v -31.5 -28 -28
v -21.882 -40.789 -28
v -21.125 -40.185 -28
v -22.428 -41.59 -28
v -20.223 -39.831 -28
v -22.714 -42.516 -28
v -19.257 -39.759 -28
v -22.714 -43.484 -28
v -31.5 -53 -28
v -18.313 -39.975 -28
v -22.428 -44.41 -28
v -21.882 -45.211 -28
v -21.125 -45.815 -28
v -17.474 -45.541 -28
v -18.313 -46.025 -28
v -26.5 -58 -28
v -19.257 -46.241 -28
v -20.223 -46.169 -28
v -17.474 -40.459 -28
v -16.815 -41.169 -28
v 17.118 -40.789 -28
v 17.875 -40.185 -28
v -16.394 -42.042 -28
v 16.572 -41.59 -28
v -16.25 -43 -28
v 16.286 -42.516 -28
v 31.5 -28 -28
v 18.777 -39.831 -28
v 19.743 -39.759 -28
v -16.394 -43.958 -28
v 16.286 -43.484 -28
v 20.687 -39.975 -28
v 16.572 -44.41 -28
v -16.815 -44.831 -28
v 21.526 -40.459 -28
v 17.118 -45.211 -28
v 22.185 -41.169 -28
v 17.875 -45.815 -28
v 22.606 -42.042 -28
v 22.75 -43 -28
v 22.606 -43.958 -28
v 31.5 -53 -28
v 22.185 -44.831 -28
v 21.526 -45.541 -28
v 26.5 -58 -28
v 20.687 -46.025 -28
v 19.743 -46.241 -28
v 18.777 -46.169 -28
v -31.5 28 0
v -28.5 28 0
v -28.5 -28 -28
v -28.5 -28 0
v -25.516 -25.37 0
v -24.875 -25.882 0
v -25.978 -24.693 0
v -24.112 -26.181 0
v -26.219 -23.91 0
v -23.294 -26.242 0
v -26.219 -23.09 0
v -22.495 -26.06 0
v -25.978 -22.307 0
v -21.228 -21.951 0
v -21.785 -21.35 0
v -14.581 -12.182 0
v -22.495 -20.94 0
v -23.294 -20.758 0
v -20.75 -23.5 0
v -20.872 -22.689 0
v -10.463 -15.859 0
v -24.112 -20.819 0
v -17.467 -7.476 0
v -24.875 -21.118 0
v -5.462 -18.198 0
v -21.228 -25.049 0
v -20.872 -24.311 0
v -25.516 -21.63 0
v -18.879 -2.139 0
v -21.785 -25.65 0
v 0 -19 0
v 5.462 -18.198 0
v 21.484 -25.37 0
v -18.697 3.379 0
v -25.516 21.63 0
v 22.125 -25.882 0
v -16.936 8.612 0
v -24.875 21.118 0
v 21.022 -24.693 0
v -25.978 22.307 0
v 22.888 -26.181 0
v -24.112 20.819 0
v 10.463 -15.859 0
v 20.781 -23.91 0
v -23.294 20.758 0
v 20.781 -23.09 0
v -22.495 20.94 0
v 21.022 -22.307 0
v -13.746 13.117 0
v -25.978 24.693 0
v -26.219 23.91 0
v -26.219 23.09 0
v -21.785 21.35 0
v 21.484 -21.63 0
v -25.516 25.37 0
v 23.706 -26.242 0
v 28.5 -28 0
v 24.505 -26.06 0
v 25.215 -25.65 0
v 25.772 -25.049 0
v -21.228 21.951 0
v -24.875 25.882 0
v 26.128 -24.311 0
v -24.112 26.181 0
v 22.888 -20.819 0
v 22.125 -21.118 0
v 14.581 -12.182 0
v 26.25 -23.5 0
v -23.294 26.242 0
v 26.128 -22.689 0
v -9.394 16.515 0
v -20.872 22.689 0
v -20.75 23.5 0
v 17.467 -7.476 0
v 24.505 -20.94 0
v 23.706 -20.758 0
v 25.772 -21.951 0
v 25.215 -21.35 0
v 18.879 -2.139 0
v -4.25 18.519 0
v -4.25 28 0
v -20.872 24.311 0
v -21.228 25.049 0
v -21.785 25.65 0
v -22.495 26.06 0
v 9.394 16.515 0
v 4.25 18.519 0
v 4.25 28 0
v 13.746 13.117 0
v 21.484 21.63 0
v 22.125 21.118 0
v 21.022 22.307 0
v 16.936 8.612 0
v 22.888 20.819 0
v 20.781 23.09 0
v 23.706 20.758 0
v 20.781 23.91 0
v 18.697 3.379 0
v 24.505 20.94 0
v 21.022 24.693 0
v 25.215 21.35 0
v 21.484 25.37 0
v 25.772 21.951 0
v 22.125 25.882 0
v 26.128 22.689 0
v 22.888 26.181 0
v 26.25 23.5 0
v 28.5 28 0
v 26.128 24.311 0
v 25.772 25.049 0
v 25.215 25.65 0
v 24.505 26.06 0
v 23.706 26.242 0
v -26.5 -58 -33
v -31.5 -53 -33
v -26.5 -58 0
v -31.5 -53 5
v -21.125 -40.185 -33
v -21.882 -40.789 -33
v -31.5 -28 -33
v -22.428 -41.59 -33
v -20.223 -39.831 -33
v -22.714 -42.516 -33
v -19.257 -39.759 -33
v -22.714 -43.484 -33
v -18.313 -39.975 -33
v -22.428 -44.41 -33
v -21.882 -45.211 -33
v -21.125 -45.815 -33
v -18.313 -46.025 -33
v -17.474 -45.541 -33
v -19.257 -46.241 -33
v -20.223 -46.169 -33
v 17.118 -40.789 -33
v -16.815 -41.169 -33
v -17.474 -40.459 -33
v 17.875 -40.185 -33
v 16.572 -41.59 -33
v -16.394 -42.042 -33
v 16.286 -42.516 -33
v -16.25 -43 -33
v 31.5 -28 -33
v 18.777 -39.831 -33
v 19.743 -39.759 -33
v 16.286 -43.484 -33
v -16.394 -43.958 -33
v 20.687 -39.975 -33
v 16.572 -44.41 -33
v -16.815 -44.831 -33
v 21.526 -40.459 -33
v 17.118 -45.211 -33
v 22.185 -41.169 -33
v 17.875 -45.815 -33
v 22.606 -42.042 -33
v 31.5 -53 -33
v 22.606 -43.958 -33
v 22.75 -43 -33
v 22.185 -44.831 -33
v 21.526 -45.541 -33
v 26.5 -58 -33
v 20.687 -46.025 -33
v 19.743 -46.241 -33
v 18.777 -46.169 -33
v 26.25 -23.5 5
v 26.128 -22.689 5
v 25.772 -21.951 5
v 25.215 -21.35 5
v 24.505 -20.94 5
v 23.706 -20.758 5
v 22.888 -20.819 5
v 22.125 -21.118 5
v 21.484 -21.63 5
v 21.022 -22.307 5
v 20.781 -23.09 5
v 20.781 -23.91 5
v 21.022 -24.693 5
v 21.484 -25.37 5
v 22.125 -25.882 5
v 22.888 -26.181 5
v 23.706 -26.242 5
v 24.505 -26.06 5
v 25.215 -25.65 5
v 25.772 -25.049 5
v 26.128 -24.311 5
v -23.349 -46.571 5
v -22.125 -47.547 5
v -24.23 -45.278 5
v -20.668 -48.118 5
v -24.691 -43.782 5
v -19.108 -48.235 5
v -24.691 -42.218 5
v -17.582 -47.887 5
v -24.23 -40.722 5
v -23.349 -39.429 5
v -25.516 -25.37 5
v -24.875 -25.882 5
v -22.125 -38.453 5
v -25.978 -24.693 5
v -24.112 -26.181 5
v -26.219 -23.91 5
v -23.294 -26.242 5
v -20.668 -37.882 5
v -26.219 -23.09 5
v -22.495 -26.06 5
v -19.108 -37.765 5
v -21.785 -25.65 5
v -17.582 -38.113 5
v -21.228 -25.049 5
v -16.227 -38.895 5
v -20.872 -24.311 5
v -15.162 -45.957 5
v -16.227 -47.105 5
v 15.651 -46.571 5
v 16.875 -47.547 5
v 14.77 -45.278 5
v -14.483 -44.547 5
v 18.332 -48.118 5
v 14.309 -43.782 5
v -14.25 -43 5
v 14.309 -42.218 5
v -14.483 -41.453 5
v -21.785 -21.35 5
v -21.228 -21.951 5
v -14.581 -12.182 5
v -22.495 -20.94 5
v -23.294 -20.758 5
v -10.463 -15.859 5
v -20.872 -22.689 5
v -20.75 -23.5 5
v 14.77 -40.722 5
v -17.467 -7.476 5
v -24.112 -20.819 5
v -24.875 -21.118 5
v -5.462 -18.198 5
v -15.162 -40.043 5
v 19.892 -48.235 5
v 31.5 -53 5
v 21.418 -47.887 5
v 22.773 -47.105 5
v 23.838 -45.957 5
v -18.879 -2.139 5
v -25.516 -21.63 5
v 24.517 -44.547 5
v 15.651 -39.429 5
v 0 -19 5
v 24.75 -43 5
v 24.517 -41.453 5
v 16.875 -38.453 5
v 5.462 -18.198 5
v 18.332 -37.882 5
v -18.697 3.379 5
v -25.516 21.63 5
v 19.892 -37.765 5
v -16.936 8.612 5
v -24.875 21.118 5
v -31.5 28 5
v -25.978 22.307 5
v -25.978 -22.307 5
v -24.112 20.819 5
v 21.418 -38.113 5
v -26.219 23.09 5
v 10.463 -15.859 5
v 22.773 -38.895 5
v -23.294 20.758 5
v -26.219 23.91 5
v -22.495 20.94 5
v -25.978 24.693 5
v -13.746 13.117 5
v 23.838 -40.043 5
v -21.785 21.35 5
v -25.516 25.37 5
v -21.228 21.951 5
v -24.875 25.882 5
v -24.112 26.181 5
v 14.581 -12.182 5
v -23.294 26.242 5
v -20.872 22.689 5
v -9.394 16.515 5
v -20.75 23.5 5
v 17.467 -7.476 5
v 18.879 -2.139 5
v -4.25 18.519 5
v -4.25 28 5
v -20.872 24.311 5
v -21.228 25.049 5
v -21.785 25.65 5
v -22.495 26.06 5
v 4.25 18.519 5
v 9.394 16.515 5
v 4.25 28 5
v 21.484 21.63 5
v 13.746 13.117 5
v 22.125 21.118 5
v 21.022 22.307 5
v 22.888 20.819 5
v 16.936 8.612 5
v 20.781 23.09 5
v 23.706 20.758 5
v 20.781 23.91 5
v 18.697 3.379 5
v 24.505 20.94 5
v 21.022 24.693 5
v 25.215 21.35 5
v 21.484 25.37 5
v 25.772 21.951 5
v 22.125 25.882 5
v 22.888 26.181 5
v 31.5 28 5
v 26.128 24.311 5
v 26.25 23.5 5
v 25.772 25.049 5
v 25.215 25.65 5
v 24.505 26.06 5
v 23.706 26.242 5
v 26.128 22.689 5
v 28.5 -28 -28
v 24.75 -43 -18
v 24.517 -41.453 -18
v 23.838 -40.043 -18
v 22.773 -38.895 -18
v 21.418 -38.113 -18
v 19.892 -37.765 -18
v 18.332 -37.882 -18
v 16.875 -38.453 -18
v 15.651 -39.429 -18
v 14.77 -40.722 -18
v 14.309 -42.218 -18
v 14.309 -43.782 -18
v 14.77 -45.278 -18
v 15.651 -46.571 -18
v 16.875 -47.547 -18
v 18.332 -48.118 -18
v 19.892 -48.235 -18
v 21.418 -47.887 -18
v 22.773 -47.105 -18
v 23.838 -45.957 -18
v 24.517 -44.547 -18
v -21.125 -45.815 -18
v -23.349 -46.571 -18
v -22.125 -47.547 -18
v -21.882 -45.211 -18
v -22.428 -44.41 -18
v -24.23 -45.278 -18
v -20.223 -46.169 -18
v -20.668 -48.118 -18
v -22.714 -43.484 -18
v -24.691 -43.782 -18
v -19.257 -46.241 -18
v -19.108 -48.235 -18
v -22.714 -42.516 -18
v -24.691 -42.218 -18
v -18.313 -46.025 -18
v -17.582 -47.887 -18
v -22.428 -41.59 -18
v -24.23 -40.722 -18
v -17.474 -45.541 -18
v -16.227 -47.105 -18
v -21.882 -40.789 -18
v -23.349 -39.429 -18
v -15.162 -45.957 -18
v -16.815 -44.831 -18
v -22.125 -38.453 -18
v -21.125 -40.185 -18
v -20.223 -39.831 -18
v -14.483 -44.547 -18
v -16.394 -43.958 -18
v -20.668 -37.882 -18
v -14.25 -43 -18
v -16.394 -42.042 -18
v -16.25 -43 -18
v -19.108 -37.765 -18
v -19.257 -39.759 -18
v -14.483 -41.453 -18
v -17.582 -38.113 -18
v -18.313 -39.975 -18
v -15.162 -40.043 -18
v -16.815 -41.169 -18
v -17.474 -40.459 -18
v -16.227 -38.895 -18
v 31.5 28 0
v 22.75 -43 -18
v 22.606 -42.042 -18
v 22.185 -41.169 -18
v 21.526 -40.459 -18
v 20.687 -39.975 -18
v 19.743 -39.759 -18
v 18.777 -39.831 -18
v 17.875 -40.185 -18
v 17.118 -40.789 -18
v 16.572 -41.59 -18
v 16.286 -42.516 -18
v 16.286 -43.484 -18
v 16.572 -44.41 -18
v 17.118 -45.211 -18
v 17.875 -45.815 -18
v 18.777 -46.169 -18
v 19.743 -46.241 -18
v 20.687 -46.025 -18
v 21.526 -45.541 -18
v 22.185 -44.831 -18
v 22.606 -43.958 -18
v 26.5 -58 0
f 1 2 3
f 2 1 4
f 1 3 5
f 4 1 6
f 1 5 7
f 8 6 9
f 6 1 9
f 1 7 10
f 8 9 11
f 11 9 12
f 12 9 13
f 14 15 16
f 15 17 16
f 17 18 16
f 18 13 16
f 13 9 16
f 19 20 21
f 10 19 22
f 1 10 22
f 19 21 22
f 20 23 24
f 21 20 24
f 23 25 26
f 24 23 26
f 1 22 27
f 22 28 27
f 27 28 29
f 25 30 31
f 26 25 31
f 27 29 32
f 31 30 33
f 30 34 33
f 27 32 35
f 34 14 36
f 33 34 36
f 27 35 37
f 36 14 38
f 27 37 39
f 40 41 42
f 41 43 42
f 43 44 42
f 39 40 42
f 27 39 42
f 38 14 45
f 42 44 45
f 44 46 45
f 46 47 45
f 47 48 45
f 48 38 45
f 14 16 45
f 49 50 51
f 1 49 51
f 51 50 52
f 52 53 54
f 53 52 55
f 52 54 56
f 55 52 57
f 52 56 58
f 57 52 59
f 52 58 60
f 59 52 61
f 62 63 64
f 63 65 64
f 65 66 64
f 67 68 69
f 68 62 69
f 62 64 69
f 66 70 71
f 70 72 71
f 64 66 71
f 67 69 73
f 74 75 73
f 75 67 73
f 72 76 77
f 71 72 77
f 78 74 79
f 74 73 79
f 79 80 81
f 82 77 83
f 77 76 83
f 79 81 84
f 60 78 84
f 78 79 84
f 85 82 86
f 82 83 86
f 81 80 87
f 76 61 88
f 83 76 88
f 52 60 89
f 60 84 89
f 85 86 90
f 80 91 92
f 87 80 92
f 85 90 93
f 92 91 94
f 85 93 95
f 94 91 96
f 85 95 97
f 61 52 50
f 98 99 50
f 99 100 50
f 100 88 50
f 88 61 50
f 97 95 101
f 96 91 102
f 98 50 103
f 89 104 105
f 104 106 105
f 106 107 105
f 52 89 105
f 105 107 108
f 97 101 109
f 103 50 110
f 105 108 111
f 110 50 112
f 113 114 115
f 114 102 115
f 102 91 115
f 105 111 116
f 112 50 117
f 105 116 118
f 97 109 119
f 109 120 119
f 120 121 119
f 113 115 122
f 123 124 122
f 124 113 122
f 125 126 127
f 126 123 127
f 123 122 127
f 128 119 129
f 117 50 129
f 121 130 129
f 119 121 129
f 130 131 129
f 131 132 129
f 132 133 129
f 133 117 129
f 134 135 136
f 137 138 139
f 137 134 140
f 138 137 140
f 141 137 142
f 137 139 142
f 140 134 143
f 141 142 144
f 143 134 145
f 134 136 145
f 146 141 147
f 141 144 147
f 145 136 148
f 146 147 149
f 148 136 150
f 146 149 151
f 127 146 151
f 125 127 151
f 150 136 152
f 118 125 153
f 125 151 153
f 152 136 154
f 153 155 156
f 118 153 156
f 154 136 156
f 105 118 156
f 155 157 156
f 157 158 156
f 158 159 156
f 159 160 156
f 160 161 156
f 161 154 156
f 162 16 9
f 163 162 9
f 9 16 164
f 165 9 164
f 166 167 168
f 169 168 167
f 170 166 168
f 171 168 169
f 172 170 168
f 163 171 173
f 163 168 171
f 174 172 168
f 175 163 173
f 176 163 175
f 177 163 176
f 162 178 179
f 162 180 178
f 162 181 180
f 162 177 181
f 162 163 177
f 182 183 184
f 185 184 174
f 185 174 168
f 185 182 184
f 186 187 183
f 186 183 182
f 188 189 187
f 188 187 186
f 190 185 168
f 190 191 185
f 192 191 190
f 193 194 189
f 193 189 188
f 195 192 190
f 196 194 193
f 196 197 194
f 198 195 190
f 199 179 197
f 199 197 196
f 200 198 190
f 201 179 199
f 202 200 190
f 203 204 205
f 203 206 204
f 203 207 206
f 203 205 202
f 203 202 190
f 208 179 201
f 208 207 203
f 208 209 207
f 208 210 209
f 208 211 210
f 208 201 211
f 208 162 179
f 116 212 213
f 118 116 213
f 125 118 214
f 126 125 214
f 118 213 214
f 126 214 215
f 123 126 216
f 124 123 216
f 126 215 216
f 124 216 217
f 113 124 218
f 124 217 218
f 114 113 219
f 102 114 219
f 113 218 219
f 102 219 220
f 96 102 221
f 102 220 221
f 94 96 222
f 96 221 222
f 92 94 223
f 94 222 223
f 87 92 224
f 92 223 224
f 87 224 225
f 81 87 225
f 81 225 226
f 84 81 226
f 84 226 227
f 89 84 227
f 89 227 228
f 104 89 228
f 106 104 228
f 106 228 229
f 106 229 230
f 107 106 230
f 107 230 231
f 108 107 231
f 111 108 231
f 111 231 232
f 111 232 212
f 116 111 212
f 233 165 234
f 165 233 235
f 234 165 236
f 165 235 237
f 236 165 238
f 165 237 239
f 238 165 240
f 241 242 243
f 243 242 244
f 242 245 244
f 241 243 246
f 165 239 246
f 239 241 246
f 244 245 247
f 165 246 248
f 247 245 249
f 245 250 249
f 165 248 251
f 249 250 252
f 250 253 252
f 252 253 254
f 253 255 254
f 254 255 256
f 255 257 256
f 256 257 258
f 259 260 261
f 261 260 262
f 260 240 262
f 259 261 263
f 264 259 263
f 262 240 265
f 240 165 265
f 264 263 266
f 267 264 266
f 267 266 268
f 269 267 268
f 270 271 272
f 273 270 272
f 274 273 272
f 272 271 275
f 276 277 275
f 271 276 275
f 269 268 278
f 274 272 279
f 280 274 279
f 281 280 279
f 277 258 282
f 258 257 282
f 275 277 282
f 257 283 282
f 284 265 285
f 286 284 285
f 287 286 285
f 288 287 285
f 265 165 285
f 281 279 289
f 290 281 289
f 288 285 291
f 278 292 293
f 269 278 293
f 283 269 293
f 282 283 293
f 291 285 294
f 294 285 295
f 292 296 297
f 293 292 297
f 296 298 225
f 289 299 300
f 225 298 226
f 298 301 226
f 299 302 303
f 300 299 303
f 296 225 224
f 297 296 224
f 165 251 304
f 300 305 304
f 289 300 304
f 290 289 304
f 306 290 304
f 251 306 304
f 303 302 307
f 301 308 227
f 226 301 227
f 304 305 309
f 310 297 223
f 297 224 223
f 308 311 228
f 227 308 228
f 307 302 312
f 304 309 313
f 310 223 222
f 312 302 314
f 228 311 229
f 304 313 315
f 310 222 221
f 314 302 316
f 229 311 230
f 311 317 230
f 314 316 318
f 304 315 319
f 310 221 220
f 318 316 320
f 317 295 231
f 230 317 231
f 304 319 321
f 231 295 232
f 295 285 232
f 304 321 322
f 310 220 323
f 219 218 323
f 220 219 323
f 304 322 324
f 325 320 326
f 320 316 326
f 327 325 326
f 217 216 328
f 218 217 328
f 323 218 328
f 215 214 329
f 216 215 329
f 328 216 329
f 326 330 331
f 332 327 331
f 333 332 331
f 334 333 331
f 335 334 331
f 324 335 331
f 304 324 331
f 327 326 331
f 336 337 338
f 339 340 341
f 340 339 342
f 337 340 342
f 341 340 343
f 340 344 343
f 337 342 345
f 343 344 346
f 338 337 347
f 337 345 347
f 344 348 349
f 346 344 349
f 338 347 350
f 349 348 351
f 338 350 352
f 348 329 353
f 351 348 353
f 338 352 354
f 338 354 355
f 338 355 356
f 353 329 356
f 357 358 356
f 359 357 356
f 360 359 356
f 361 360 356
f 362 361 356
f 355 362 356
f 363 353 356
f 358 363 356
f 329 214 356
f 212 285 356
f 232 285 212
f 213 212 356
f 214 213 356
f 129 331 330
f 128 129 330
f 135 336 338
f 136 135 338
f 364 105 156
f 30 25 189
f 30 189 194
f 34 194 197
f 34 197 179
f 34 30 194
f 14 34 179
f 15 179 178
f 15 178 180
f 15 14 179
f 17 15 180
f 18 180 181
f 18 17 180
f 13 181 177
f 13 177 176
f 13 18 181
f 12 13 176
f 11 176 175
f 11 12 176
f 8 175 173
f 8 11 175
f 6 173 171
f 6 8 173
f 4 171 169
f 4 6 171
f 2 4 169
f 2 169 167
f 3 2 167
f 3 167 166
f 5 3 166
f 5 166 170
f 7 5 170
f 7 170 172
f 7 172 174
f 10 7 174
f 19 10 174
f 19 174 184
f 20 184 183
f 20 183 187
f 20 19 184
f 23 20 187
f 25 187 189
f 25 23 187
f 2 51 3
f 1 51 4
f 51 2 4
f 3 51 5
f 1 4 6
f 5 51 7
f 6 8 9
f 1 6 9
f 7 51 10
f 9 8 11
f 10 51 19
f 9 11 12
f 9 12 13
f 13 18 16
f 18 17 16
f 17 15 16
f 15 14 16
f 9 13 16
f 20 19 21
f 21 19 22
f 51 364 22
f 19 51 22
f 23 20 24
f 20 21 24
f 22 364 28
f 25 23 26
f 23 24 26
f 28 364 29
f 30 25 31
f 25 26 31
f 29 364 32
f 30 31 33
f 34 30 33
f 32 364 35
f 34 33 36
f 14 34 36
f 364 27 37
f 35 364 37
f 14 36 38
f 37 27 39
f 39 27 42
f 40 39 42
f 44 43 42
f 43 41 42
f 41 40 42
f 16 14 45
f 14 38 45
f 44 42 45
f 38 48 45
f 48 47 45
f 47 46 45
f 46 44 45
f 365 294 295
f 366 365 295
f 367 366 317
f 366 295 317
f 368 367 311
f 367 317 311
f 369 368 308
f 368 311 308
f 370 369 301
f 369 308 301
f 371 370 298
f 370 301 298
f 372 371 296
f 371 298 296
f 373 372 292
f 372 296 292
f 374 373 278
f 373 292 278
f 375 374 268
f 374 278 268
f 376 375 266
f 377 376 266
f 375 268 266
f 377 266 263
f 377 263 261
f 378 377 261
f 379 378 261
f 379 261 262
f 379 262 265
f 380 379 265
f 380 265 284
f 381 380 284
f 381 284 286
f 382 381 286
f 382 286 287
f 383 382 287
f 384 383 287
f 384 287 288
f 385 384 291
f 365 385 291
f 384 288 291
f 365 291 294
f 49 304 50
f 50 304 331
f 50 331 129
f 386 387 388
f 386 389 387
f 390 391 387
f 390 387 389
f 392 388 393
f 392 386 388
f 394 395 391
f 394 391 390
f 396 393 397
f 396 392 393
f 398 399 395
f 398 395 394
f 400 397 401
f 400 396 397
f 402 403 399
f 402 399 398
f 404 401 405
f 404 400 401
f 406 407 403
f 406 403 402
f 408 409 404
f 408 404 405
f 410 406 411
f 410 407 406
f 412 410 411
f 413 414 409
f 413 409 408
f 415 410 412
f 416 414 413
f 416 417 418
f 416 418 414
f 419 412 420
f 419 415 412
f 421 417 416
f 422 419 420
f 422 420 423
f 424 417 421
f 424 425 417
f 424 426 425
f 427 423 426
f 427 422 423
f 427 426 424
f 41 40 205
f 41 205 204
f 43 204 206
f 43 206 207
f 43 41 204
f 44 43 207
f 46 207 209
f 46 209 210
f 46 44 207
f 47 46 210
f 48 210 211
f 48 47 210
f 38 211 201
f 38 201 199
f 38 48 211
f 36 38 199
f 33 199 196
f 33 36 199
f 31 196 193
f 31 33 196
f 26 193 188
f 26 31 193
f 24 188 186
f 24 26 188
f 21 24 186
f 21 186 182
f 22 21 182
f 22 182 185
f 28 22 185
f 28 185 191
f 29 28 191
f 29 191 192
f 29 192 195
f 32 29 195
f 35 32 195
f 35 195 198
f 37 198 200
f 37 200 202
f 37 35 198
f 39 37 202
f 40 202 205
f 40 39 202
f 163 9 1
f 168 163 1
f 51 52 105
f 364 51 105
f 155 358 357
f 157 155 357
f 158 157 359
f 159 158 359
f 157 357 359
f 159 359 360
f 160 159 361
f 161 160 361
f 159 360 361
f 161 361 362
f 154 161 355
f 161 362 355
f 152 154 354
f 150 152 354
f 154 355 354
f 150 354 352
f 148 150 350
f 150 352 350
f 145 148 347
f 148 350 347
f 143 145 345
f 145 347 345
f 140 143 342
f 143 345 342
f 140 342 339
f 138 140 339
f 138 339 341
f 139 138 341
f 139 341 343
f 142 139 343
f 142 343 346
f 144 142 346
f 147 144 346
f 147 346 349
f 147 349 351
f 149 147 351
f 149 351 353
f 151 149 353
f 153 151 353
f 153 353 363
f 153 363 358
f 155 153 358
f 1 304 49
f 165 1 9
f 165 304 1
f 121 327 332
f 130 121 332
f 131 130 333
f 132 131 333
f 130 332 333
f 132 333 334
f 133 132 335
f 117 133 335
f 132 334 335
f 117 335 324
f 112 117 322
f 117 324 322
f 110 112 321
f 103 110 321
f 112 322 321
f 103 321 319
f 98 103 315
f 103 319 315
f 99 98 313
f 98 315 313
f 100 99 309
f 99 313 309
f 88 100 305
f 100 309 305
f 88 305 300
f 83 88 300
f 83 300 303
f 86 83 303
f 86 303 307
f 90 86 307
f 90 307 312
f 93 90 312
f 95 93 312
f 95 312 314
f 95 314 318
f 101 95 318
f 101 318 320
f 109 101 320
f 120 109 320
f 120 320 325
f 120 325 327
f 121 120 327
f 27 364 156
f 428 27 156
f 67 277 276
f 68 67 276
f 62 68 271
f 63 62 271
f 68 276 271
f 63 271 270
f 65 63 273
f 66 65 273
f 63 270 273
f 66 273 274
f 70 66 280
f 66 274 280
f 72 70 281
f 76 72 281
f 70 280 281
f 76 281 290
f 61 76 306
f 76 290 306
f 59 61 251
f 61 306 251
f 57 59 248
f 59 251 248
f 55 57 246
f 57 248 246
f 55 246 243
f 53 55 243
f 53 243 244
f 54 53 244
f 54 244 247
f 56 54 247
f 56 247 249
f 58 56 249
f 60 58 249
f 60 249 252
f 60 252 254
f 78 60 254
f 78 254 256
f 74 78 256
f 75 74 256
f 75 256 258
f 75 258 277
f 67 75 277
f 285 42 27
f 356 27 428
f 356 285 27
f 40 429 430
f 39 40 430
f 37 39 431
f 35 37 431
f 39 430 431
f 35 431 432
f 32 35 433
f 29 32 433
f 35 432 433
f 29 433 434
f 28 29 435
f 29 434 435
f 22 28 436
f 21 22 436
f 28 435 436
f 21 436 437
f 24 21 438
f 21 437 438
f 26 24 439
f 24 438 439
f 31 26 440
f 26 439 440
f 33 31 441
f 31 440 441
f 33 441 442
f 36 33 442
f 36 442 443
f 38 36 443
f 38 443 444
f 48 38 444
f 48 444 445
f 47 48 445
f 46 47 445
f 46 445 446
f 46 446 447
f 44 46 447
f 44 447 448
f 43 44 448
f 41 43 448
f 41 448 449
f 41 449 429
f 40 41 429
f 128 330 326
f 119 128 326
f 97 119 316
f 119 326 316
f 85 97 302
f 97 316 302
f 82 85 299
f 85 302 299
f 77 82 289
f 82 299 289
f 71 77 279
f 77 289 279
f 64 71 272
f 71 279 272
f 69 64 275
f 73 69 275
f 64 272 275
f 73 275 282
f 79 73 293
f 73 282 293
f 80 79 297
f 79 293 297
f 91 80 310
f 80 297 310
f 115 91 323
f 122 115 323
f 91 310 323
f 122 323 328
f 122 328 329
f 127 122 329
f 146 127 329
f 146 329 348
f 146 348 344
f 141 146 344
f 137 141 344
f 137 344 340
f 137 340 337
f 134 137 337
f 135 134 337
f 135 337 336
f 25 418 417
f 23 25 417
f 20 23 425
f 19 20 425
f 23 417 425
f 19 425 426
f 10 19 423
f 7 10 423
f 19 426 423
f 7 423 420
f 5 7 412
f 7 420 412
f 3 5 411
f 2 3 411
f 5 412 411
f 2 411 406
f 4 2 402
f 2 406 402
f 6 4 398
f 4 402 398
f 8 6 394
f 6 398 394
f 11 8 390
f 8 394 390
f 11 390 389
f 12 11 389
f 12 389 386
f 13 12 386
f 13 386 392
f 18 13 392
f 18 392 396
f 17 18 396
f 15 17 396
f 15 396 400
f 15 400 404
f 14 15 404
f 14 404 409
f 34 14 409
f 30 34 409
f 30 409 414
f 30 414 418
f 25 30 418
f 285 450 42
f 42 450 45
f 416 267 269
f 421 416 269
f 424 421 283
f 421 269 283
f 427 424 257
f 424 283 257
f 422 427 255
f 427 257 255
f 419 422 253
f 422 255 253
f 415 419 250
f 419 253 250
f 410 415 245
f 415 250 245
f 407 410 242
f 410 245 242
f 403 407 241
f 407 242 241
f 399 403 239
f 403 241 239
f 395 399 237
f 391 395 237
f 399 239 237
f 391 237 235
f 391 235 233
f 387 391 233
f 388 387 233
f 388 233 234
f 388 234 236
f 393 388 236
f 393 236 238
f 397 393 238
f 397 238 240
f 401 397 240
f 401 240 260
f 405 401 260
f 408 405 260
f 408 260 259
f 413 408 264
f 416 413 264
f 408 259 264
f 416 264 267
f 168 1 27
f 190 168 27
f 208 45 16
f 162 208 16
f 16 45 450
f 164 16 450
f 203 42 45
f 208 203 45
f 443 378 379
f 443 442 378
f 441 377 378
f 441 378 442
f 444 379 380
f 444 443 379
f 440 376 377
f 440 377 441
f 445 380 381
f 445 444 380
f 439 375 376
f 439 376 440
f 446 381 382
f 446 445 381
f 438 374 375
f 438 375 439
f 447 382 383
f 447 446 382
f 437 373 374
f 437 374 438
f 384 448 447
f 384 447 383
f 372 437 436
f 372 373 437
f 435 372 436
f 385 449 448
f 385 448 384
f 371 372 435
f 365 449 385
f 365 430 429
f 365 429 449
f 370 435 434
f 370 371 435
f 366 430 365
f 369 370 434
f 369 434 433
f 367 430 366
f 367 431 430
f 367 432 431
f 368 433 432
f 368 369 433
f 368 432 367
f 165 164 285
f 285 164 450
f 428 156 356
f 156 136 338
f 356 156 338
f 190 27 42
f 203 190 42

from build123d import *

# Parameters (mm, degrees)
F0_W      = 57
F0_H      = 56
F1_DEPTH  = 5
F2_R      = 2.75
F3_DEPTH  = 25
F4_W      = 57
F4_H      = 30
F5_DEPTH  = 33
F6_R      = 5.25
F7_DEPTH  = 23
F8_R      = 3.25
F9_DEPTH  = 33.001
F11_DEPTH = 3
F13_DEPTH = 3
F14_SIZE  = 5
F15_R     = 3.25
F16_DEPTH = 5


with BuildPart() as f1:
    # F0 (on Top) → F1 (new body)
    with BuildSketch(Plane.XY):
        Rectangle(F0_W, F0_H)
    extrude(amount=F1_DEPTH)

    # F2 (on face) → F3 (cut)
    with BuildSketch(Plane.XY.offset(5)):
        with Locations((-23.5, -23.5)):
            Circle(F2_R)
        with Locations((23.5, -23.5)):
            Circle(F2_R)
        with Locations((23.5, 23.5)):
            Circle(F2_R)
        with Locations((-23.5, 23.5)):
            Circle(F2_R)
        with BuildLine():
            Line((-4.25, 28), (-4.25, 18.518572))
            ThreePointArc((-4.25, 18.518572), (0, -19), (4.25, 18.518572))
            Line((4.25, 18.518572), (4.25, 28))
            Line((4.25, 28), (-4.25, 28))
        make_face()
    extrude(amount=-F3_DEPTH, mode=Mode.SUBTRACT)

    # F4 (on face) → F5 (join)
    with BuildSketch(Plane.XY.offset(5)):
        with Locations((0, -43)):
            Rectangle(F4_W, F4_H)
    extrude(amount=-F5_DEPTH)

    # F6 (on face) → F7 (cut)
    with BuildSketch(Plane.XY.offset(5)):
        with Locations((-19.5, -43)):
            Circle(F6_R)
        with Locations((19.5, -43)):
            Circle(F6_R)
    extrude(amount=-F7_DEPTH, mode=Mode.SUBTRACT)

    # F8 (on face) → F9 (cut, through all)
    with BuildSketch(Plane.XY.offset(5)):
        with Locations((-19.5, -43)):
            Circle(F8_R)
        with Locations((19.5, -43)):
            Circle(F8_R)
    extrude(amount=-F9_DEPTH, mode=Mode.SUBTRACT)

    # F10 (on face) → F11 (join)
    with BuildSketch(Plane.YZ.offset(28.5)):
        Polygon((-28, -28), (-28, 0), (28, 0), (28, 5), (-58, 5), (-58, -28), align=None)
        Polygon((28, 0), (-28, 0), (-28, -28), align=None)
    extrude(amount=F11_DEPTH)

    # F12 (on face) → F13 (join)
    with BuildSketch(Plane(origin=(-28.5, 0, 0), x_dir=(0, -1, 0), z_dir=(-1, 0, 0))):
        Polygon((28, 0), (-28, 0), (28, -28), align=None)
        Polygon((-28, 5), (-28, 0), (28, 0), (28, -28), (58, -28), (58, 5), align=None)
    extrude(amount=F13_DEPTH)

    # F14
    f14_edges = [f1.edges().sort_by_distance(p)[0] for p in [
        (31.5, -58, -11.5),
        (-31.5, -58, -11.5),
        (0, -58, 5),
    ]]
    chamfer(f14_edges, length=F14_SIZE)


with BuildPart() as f16:
    # F15 (on face) → F16 (new body)
    with BuildSketch(Plane(origin=(0, 0, -28), x_dir=(1, 0, 0), z_dir=(0, 0, -1))):
        Polygon((31.5, 53), (26.5, 58), (-26.5, 58), (-31.5, 53), (-31.5, 28), (-28.5, 28), (28.5, 28), (31.5, 28), align=None)
        with Locations((-19.5, 43)):
            Circle(F15_R, mode=Mode.SUBTRACT)
        with Locations((19.5, 43)):
            Circle(F15_R, mode=Mode.SUBTRACT)
    extrude(amount=F16_DEPTH)


solid = Compound([f1.part, f16.part])
